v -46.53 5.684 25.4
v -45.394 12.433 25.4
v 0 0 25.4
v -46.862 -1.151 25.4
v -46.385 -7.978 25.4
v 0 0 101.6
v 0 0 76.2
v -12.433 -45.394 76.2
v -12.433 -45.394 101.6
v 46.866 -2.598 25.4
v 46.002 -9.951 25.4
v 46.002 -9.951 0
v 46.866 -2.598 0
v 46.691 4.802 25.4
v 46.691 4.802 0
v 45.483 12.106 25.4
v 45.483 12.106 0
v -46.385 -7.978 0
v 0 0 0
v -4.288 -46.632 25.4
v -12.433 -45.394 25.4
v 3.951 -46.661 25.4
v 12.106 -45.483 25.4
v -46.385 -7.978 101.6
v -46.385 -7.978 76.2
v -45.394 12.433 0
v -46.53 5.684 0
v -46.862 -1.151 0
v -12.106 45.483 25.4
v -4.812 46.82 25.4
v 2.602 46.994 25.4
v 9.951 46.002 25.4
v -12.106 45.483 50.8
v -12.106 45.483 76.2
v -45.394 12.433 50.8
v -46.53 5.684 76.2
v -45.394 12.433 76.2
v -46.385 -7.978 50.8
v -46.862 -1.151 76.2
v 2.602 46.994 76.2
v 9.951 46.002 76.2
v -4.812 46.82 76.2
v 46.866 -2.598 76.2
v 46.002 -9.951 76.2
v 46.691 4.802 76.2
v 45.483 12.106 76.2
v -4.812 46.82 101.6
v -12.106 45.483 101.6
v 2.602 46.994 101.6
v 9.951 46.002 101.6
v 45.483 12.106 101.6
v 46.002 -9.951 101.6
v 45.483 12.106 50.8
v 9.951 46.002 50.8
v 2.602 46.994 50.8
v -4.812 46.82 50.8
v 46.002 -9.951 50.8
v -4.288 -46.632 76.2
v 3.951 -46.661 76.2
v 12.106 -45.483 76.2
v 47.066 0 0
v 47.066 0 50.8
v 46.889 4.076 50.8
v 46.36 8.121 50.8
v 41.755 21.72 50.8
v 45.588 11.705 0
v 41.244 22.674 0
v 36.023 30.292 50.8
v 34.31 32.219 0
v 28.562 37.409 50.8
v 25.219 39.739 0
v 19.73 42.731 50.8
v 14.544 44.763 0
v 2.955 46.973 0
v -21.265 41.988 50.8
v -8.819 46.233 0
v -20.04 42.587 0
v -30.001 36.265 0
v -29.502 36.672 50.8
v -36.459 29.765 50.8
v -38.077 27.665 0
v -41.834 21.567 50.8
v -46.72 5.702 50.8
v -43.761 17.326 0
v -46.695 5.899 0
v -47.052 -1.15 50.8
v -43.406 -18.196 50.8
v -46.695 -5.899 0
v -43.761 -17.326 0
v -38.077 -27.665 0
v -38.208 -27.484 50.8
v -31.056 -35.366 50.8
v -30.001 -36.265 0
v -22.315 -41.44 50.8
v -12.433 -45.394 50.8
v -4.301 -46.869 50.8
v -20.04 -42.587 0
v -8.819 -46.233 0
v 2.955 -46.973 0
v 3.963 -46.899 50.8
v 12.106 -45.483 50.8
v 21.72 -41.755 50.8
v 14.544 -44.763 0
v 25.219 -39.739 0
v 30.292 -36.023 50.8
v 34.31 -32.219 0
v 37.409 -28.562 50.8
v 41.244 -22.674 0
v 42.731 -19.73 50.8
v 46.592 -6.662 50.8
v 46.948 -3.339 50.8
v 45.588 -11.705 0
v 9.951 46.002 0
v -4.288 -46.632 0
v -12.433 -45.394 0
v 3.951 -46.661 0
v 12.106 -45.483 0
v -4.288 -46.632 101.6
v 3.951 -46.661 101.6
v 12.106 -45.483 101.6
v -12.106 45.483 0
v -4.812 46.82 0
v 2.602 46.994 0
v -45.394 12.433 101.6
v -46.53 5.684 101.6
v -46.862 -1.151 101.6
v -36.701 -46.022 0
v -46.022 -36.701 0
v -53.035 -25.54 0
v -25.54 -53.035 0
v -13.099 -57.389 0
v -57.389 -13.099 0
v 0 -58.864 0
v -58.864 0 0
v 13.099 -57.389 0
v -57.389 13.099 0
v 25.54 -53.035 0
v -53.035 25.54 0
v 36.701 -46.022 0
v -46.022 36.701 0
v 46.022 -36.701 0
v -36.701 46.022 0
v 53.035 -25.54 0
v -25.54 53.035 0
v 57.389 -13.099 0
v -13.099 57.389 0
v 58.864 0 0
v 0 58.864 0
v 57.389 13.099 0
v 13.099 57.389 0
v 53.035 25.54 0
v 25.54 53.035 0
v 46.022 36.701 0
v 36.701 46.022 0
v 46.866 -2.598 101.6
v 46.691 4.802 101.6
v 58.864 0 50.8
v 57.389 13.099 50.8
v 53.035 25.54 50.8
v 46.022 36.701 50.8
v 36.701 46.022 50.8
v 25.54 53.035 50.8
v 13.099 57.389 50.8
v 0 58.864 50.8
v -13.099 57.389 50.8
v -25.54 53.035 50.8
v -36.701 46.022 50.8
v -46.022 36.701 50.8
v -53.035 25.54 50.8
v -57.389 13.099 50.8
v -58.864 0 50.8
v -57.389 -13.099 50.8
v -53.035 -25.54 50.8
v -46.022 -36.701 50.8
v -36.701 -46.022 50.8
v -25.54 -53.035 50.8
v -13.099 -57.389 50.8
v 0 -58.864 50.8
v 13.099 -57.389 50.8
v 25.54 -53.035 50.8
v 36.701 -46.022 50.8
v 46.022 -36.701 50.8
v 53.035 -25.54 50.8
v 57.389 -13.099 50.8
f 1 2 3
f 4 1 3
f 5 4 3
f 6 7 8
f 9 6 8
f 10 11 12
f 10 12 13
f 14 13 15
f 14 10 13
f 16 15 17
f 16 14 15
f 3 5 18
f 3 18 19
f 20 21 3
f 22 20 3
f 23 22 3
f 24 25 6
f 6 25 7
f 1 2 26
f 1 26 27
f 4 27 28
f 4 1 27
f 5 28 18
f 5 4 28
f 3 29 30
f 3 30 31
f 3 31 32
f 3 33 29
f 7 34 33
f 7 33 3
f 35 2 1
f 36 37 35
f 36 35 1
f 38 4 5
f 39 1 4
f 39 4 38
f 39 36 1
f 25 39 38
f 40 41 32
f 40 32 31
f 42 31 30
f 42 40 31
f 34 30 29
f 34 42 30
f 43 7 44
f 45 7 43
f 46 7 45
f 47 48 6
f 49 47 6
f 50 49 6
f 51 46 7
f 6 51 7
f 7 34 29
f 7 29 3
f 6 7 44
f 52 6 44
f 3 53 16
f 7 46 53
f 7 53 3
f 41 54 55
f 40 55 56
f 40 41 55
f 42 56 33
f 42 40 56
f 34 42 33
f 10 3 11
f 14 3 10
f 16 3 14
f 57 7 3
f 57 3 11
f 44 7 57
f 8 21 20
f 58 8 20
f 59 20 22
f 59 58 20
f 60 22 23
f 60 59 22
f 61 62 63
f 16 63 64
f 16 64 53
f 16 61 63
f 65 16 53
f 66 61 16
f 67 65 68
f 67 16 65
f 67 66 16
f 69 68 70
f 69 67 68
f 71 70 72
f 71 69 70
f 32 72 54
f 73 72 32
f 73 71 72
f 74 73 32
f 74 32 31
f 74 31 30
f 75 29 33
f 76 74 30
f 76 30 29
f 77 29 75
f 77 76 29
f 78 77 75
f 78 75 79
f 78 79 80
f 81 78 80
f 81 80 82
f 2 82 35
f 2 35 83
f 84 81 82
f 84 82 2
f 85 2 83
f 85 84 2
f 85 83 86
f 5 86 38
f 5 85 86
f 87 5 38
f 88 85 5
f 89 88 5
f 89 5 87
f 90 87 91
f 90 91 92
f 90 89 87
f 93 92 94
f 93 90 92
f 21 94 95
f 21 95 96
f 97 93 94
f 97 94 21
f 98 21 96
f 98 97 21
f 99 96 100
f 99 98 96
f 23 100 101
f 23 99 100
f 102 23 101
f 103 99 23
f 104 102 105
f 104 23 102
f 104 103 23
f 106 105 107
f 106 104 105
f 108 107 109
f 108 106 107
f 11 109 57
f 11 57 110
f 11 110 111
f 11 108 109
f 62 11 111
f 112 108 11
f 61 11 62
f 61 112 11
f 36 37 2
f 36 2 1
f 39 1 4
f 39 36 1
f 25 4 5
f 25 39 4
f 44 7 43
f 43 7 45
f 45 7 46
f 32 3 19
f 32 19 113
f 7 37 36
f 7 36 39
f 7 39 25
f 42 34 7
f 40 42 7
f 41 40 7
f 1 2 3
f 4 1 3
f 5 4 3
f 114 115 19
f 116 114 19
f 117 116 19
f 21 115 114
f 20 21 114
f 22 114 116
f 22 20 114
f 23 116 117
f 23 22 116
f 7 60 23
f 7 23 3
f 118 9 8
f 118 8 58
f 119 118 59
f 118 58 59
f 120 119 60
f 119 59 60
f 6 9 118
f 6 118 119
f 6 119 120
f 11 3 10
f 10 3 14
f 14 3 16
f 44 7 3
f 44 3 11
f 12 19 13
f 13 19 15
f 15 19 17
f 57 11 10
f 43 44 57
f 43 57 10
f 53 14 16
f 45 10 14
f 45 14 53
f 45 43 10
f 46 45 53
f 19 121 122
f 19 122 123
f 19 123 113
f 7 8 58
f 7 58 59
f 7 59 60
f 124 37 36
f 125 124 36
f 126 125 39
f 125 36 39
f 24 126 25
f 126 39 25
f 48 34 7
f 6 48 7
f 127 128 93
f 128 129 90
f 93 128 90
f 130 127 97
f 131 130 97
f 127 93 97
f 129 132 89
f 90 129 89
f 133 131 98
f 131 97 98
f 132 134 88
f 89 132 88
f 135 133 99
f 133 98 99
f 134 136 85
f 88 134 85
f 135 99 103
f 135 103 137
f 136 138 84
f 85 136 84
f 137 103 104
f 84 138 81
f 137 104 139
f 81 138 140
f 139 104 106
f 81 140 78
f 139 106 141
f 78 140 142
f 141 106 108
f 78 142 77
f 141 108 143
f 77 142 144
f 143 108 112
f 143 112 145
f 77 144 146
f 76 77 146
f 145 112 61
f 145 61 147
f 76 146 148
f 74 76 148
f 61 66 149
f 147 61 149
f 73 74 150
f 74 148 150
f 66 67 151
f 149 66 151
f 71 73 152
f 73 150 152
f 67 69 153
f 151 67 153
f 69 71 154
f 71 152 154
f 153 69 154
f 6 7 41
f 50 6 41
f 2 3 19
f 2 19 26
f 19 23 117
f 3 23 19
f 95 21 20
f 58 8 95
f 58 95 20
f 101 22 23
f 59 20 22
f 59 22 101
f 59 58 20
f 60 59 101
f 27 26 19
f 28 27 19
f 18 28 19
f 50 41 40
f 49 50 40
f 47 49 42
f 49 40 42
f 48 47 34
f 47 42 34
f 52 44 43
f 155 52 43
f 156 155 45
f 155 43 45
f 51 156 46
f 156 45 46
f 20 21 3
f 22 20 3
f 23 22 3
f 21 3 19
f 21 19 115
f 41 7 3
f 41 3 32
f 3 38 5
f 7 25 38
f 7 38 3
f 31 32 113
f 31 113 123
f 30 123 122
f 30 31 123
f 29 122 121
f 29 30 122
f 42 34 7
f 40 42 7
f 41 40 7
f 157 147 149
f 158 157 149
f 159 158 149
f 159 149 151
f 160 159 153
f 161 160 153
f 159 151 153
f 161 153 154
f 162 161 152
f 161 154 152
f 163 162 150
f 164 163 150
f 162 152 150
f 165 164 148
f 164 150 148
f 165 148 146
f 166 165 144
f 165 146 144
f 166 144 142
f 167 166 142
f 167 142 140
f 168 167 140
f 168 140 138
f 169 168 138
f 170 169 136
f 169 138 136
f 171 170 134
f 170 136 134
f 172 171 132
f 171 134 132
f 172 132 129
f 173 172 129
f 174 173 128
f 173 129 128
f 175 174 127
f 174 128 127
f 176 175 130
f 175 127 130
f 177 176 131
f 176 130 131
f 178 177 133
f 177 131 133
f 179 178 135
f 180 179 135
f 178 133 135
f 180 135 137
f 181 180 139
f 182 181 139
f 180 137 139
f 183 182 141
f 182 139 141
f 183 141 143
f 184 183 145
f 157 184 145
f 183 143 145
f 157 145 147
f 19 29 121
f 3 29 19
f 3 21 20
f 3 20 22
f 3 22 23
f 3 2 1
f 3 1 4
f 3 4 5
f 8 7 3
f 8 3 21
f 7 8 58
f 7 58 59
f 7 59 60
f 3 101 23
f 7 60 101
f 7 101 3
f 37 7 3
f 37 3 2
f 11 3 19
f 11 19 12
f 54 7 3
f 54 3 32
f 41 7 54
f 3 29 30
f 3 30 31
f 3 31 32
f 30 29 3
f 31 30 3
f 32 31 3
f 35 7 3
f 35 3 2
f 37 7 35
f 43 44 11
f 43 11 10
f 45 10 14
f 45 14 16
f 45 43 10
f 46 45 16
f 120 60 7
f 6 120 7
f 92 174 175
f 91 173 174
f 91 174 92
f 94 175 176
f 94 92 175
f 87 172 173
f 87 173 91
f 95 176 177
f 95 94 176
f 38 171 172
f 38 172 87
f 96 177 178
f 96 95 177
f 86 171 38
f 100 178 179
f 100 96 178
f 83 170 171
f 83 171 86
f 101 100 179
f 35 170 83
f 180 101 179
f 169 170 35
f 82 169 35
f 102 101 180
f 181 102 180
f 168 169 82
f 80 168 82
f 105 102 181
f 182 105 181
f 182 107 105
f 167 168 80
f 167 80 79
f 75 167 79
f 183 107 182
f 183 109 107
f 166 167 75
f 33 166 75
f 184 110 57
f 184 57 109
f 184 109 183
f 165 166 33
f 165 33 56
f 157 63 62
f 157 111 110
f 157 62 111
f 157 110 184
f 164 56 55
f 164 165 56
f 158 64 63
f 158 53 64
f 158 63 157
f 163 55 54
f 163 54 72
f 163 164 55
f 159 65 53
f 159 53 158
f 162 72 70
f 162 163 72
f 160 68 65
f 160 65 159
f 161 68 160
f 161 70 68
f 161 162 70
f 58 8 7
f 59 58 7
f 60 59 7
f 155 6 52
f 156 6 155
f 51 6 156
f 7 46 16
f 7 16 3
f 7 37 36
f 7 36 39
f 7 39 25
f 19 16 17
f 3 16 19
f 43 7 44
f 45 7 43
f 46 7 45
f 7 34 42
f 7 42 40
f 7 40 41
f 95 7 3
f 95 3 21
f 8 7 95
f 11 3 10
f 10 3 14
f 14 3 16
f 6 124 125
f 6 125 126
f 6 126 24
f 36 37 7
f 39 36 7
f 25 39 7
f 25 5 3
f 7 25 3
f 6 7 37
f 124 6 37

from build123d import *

# Parameters (mm, degrees)
F0_R     = 58.8645
F0_R_2   = 47.0662
F1_DEPTH = 50.8
F3_DEPTH = 25.4
F4_DEPTH = 50.8
F5_DEPTH = 25.4
F6_DEPTH = 25.4


with BuildPart() as f1:
    # F0 (on Top) → F1 (new body)
    with BuildSketch(Plane.XY):
        Circle(F0_R)
        Circle(F0_R_2, mode=Mode.SUBTRACT)
    extrude(amount=F1_DEPTH)

    # F2 (on face) → F3 (join, symmetric)
    with BuildSketch(Plane.XY.offset(50.8)):
        with BuildLine():
            Line((-12.1056949536, 45.4827366385), (0, 0))
            Line((0, 0), (9.9506329246, 46.002305234))
            ThreePointArc((9.9506329246, 46.002305234), (-1.1084046953, 47.0531467754), (-12.1056949536, 45.4827366385))
        make_face()
        with BuildLine():
            Line((45.4827366385, 12.1056949536), (0, 0))
            Line((0, 0), (46.002305234, -9.9506329246))
            ThreePointArc((46.002305234, -9.9506329246), (46.9083962016, 1.1049948869), (45.4827366385, 12.1056949536))
        make_face()
        with BuildLine():
            Line((12.1056949536, -45.4827366385), (0, 0))
            Line((0, 0), (-12.4332453646, -45.3942903033))
            ThreePointArc((-12.4332453646, -45.3942903033), (-0.1686759799, -46.7982058703), (12.1056949536, -45.4827366385))
        make_face()
        with BuildLine():
            Line((-46.385078942, -7.9781974142), (0, 0))
            Line((0, 0), (-45.3942903033, 12.4332453646))
            ThreePointArc((-45.3942903033, 12.4332453646), (-46.7973228873, 2.2715815017), (-46.385078942, -7.9781974142))
        make_face()
    extrude(amount=F3_DEPTH, both=True)


with BuildPart() as f4:
    # F4 (new): a face of the model
    f4_faces = [f1.part.faces().sort_by_distance(p)[0] for p in [
        (-0.7320628202, 31.0769698775, 76.2),
    ]]
    extrude(f4_faces, amount=-F4_DEPTH)


with BuildPart() as f4b:
    # F4#2 (new): a face of the model
    f4_2_faces = [f1.part.faces().sort_by_distance(p)[0] for p in [
        (-30.9961070931, 1.5045771671, 76.2),
    ]]
    extrude(f4_2_faces, amount=-F4_DEPTH)


with BuildPart() as f4c:
    # F4#3 (new): a face of the model
    f4_3_faces = [f1.part.faces().sort_by_distance(p)[0] for p in [
        (-0.1113584297, -30.895772613, 76.2),
    ]]
    extrude(f4_3_faces, amount=-F4_DEPTH)


with BuildPart() as f4d:
    # F4#4 (new): a face of the model
    f4_4_faces = [f1.part.faces().sort_by_distance(p)[0] for p in [
        (31.0126069708, 0.7305466592, 76.2),
    ]]
    extrude(f4_4_faces, amount=-F4_DEPTH)


with BuildPart() as f5:
    # F5 (new): a face of the model
    f5_faces = [f1.part.faces().sort_by_distance(p)[0] for p in [
        (31.0126069708, 0.7305466592, 25.4),
    ]]
    extrude(f5_faces, amount=F5_DEPTH)


with BuildPart() as f5b:
    # F5#2 (new): a face of the model
    f5_2_faces = [f1.part.faces().sort_by_distance(p)[0] for p in [
        (-0.1113584297, -30.895772613, 25.4),
    ]]
    extrude(f5_2_faces, amount=F5_DEPTH)


with BuildPart() as f5c:
    # F5#3 (new): a face of the model
    f5_3_faces = [f1.part.faces().sort_by_distance(p)[0] for p in [
        (-30.9961070931, 1.5045771671, 25.4),
    ]]
    extrude(f5_3_faces, amount=F5_DEPTH)


with BuildPart() as f5d:
    # F5#4 (new): a face of the model
    f5_4_faces = [f1.part.faces().sort_by_distance(p)[0] for p in [
        (-0.7320628202, 31.0769698775, 25.4),
    ]]
    extrude(f5_4_faces, amount=F5_DEPTH)


with BuildPart() as f6:
    # F6 (new): a face of the model
    f6_faces = [f4d.part.faces().sort_by_distance(p)[0] for p in [
        (31.0126069708, 0.7305466592, 76.2),
    ]]
    extrude(f6_faces, amount=F6_DEPTH)


with BuildPart() as f6b:
    # F6#2 (new): a face of the model
    f6_2_faces = [f1.part.faces().sort_by_distance(p)[0] for p in [
        (-0.1113584297, -30.895772613, 76.2),
    ]]
    extrude(f6_2_faces, amount=F6_DEPTH)


with BuildPart() as f6c:
    # F6#3 (new): a face of the model
    f6_3_faces = [f1.part.faces().sort_by_distance(p)[0] for p in [
        (-30.9961070931, 1.5045771671, 76.2),
    ]]
    extrude(f6_3_faces, amount=F6_DEPTH)


with BuildPart() as f6d:
    # F6#4 (new): a face of the model
    f6_4_faces = [f1.part.faces().sort_by_distance(p)[0] for p in [
        (-0.7320628202, 31.0769698775, 76.2),
    ]]
    extrude(f6_4_faces, amount=F6_DEPTH)


solid = Compound([f1.part, f4.part, f4b.part, f4c.part, f4d.part, f5.part, f5b.part, f5c.part, f5d.part, f6.part, f6b.part, f6c.part, f6d.part])
